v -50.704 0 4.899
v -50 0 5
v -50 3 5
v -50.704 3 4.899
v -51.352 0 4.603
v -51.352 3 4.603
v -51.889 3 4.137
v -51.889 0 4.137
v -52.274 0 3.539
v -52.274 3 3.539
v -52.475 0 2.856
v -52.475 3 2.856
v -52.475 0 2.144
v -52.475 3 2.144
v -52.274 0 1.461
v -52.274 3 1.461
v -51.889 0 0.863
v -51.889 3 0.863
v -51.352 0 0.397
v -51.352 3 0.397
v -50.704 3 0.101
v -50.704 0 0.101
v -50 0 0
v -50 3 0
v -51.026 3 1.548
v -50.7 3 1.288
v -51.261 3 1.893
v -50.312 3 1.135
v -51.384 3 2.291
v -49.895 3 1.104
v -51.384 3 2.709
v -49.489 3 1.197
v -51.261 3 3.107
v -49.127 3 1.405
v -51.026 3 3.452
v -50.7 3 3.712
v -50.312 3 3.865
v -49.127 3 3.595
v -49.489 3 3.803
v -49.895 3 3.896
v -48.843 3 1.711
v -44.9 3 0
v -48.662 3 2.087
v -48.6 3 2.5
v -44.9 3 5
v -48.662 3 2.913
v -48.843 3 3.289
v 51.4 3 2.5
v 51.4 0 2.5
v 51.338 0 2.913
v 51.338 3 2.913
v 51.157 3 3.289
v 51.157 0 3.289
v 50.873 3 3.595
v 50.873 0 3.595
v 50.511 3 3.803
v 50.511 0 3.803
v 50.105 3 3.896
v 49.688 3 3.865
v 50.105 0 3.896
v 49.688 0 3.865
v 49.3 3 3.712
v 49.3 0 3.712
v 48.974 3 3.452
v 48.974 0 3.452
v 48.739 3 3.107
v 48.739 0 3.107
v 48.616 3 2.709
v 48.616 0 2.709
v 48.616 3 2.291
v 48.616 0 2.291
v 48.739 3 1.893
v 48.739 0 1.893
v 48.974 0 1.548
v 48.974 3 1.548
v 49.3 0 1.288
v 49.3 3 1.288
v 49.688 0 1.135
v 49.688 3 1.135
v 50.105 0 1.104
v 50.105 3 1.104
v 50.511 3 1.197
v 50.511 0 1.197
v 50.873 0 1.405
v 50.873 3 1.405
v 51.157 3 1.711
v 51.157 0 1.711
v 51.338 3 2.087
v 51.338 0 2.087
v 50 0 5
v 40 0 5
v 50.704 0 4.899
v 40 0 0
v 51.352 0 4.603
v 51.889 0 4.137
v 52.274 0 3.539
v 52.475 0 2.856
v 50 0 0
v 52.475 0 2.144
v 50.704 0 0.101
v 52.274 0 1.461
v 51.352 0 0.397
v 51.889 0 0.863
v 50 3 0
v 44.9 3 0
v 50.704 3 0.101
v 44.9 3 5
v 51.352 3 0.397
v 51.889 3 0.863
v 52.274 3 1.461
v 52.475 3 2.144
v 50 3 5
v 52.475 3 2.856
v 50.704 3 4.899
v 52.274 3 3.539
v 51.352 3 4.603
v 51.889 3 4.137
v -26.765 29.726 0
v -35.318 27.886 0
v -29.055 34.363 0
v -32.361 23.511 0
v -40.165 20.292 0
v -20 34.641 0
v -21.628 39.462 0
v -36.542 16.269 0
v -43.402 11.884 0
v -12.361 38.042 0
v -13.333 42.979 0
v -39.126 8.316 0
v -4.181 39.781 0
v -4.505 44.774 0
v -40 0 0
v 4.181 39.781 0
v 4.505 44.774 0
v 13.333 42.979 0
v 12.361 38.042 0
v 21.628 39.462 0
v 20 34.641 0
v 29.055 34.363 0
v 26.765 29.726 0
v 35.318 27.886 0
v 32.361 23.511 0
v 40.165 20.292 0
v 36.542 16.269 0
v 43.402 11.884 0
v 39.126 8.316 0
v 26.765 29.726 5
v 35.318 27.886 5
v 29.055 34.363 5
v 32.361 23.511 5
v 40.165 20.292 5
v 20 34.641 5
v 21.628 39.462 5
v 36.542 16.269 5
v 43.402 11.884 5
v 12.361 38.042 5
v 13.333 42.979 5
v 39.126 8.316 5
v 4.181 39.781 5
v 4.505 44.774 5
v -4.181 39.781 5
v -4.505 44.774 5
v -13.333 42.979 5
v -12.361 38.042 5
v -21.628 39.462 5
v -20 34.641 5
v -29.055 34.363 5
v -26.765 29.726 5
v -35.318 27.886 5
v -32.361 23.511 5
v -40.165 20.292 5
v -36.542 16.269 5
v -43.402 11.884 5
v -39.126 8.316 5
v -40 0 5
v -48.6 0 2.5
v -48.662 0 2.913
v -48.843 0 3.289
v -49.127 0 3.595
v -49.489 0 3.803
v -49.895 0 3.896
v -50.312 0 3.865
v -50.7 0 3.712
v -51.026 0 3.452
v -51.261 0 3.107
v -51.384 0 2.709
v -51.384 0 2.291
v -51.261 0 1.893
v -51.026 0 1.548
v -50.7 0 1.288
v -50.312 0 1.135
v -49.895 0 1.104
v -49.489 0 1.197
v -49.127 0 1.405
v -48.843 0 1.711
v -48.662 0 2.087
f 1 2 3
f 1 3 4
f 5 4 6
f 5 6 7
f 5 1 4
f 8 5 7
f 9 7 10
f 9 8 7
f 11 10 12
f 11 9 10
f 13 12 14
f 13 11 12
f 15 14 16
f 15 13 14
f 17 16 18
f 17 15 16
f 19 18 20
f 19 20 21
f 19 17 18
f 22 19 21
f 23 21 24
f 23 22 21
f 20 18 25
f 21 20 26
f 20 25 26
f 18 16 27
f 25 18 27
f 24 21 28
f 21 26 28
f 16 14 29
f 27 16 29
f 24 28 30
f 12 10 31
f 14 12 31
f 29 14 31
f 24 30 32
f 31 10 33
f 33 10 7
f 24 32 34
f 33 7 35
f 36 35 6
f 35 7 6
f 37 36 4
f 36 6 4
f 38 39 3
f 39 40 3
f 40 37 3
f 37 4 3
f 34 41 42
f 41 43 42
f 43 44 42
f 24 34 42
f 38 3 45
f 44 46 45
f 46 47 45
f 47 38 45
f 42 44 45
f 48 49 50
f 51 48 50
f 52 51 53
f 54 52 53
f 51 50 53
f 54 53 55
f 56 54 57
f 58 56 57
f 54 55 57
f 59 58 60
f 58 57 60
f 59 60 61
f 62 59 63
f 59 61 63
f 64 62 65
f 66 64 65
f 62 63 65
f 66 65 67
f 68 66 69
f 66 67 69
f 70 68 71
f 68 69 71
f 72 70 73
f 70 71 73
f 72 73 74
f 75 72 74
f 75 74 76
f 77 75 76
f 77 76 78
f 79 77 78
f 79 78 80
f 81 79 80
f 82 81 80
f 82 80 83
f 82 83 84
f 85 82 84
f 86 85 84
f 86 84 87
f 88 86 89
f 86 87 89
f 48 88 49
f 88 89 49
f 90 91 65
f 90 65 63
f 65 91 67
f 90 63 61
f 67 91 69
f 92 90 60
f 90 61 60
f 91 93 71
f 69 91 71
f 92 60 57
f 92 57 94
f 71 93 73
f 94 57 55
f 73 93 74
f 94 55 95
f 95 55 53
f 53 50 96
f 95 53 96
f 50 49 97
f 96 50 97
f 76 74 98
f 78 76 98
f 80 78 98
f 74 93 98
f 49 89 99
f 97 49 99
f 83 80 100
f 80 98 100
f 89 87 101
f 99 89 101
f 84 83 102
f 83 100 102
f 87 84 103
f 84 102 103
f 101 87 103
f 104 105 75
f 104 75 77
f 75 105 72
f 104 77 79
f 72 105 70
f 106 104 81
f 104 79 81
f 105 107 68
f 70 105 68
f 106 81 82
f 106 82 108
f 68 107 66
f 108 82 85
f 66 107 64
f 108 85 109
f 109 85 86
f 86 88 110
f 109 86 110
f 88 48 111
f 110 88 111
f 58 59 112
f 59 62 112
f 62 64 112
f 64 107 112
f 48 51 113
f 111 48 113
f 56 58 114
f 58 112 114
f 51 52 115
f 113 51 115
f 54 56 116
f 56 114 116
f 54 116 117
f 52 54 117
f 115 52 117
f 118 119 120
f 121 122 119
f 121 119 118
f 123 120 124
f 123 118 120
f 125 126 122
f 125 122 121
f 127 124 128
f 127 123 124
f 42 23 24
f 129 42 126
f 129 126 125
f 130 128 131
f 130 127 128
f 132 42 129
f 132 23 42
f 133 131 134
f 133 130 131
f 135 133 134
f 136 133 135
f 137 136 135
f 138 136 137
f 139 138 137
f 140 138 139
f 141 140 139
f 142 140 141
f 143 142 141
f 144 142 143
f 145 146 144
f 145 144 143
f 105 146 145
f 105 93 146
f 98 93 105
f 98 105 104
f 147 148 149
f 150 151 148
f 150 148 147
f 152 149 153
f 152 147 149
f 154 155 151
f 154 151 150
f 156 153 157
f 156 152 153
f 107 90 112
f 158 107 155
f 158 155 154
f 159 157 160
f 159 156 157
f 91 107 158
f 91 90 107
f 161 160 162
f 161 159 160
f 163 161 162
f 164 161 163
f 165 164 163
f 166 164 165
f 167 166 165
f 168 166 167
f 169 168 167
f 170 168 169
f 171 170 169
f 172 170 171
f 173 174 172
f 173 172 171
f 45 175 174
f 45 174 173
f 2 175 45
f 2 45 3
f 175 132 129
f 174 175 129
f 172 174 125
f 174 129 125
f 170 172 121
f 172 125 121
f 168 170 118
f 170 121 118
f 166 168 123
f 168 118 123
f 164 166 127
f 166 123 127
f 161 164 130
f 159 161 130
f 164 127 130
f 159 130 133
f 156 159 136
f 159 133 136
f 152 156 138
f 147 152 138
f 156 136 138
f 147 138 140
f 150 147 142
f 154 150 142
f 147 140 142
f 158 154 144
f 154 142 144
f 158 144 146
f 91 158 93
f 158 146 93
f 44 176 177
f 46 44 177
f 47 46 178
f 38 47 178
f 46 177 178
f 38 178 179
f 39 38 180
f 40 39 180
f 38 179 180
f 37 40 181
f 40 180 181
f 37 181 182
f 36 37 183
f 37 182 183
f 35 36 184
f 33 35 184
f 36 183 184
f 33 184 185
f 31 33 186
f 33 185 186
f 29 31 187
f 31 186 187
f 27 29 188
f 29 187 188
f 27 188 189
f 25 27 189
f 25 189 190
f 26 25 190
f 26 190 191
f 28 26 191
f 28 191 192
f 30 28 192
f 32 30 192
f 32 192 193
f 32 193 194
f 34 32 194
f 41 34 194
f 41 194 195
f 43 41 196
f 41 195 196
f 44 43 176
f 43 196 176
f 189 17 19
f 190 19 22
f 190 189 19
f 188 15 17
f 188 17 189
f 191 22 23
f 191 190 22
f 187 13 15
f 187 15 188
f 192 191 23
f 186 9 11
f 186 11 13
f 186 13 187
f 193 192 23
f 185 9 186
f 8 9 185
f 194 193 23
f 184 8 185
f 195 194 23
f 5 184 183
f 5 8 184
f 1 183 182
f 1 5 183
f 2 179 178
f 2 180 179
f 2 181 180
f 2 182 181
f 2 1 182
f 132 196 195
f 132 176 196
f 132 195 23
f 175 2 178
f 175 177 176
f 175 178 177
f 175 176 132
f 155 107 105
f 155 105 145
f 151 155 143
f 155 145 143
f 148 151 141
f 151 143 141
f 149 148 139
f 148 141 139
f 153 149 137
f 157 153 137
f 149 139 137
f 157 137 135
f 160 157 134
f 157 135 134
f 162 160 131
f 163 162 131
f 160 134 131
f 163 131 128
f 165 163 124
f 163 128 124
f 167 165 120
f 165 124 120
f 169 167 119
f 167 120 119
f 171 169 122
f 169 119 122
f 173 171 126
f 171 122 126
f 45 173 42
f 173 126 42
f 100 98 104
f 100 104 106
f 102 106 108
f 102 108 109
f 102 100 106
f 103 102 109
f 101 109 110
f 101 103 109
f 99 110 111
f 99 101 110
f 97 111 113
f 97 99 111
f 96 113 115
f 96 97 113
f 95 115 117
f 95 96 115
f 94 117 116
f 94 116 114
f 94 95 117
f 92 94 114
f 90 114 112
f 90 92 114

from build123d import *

# Parameters (mm, degrees)
EXTRUDE_1_DEPTH = 5
SKETCH_2_R      = 1.4
EXTRUDE_2_DEPTH = 3


with BuildPart() as part:
    # 草图1 → 凸台-拉伸1 (new body)
    with BuildSketch(Plane.XY):
        with BuildLine():
            Line((-45, 0), (-40, 0))
            ThreePointArc((-40, 0), (0, 40), (40, 0))
            Line((40, 0), (45, 0))
            ThreePointArc((45, 0), (0, 45), (-45, 0))
        make_face()
    extrude(amount=EXTRUDE_1_DEPTH)

    # 草图2 → 凸台-拉伸2 (add)
    with BuildSketch(Plane.XZ):
        with BuildLine():
            Line((-45, 5), (-50, 5))
            ThreePointArc((-50, 5), (-52.5, 2.5), (-50, 0))
            Line((-50, 0), (-45, 0))
            Line((-45, 0), (-44.132295493, 0))
            Line((-44.132295493, 0), (-44.132295493, 5))
            Line((-44.132295493, 5), (-45, 5))
        make_face()
        with Locations((-50, 2.5)):
            Circle(SKETCH_2_R, mode=Mode.SUBTRACT)
        with BuildLine():
            Line((44.132295493, 5), (44.132295493, 0))
            Line((44.132295493, 0), (45, 0))
            Line((45, 0), (50, 0))
            ThreePointArc((50, 0), (52.5, 2.5), (50, 5))
            Line((50, 5), (45, 5))
            Line((45, 5), (44.132295493, 5))
        make_face()
        with Locations((50, 2.5)):
            Circle(SKETCH_2_R, mode=Mode.SUBTRACT)
    extrude(amount=-EXTRUDE_2_DEPTH)


solid = part.part
